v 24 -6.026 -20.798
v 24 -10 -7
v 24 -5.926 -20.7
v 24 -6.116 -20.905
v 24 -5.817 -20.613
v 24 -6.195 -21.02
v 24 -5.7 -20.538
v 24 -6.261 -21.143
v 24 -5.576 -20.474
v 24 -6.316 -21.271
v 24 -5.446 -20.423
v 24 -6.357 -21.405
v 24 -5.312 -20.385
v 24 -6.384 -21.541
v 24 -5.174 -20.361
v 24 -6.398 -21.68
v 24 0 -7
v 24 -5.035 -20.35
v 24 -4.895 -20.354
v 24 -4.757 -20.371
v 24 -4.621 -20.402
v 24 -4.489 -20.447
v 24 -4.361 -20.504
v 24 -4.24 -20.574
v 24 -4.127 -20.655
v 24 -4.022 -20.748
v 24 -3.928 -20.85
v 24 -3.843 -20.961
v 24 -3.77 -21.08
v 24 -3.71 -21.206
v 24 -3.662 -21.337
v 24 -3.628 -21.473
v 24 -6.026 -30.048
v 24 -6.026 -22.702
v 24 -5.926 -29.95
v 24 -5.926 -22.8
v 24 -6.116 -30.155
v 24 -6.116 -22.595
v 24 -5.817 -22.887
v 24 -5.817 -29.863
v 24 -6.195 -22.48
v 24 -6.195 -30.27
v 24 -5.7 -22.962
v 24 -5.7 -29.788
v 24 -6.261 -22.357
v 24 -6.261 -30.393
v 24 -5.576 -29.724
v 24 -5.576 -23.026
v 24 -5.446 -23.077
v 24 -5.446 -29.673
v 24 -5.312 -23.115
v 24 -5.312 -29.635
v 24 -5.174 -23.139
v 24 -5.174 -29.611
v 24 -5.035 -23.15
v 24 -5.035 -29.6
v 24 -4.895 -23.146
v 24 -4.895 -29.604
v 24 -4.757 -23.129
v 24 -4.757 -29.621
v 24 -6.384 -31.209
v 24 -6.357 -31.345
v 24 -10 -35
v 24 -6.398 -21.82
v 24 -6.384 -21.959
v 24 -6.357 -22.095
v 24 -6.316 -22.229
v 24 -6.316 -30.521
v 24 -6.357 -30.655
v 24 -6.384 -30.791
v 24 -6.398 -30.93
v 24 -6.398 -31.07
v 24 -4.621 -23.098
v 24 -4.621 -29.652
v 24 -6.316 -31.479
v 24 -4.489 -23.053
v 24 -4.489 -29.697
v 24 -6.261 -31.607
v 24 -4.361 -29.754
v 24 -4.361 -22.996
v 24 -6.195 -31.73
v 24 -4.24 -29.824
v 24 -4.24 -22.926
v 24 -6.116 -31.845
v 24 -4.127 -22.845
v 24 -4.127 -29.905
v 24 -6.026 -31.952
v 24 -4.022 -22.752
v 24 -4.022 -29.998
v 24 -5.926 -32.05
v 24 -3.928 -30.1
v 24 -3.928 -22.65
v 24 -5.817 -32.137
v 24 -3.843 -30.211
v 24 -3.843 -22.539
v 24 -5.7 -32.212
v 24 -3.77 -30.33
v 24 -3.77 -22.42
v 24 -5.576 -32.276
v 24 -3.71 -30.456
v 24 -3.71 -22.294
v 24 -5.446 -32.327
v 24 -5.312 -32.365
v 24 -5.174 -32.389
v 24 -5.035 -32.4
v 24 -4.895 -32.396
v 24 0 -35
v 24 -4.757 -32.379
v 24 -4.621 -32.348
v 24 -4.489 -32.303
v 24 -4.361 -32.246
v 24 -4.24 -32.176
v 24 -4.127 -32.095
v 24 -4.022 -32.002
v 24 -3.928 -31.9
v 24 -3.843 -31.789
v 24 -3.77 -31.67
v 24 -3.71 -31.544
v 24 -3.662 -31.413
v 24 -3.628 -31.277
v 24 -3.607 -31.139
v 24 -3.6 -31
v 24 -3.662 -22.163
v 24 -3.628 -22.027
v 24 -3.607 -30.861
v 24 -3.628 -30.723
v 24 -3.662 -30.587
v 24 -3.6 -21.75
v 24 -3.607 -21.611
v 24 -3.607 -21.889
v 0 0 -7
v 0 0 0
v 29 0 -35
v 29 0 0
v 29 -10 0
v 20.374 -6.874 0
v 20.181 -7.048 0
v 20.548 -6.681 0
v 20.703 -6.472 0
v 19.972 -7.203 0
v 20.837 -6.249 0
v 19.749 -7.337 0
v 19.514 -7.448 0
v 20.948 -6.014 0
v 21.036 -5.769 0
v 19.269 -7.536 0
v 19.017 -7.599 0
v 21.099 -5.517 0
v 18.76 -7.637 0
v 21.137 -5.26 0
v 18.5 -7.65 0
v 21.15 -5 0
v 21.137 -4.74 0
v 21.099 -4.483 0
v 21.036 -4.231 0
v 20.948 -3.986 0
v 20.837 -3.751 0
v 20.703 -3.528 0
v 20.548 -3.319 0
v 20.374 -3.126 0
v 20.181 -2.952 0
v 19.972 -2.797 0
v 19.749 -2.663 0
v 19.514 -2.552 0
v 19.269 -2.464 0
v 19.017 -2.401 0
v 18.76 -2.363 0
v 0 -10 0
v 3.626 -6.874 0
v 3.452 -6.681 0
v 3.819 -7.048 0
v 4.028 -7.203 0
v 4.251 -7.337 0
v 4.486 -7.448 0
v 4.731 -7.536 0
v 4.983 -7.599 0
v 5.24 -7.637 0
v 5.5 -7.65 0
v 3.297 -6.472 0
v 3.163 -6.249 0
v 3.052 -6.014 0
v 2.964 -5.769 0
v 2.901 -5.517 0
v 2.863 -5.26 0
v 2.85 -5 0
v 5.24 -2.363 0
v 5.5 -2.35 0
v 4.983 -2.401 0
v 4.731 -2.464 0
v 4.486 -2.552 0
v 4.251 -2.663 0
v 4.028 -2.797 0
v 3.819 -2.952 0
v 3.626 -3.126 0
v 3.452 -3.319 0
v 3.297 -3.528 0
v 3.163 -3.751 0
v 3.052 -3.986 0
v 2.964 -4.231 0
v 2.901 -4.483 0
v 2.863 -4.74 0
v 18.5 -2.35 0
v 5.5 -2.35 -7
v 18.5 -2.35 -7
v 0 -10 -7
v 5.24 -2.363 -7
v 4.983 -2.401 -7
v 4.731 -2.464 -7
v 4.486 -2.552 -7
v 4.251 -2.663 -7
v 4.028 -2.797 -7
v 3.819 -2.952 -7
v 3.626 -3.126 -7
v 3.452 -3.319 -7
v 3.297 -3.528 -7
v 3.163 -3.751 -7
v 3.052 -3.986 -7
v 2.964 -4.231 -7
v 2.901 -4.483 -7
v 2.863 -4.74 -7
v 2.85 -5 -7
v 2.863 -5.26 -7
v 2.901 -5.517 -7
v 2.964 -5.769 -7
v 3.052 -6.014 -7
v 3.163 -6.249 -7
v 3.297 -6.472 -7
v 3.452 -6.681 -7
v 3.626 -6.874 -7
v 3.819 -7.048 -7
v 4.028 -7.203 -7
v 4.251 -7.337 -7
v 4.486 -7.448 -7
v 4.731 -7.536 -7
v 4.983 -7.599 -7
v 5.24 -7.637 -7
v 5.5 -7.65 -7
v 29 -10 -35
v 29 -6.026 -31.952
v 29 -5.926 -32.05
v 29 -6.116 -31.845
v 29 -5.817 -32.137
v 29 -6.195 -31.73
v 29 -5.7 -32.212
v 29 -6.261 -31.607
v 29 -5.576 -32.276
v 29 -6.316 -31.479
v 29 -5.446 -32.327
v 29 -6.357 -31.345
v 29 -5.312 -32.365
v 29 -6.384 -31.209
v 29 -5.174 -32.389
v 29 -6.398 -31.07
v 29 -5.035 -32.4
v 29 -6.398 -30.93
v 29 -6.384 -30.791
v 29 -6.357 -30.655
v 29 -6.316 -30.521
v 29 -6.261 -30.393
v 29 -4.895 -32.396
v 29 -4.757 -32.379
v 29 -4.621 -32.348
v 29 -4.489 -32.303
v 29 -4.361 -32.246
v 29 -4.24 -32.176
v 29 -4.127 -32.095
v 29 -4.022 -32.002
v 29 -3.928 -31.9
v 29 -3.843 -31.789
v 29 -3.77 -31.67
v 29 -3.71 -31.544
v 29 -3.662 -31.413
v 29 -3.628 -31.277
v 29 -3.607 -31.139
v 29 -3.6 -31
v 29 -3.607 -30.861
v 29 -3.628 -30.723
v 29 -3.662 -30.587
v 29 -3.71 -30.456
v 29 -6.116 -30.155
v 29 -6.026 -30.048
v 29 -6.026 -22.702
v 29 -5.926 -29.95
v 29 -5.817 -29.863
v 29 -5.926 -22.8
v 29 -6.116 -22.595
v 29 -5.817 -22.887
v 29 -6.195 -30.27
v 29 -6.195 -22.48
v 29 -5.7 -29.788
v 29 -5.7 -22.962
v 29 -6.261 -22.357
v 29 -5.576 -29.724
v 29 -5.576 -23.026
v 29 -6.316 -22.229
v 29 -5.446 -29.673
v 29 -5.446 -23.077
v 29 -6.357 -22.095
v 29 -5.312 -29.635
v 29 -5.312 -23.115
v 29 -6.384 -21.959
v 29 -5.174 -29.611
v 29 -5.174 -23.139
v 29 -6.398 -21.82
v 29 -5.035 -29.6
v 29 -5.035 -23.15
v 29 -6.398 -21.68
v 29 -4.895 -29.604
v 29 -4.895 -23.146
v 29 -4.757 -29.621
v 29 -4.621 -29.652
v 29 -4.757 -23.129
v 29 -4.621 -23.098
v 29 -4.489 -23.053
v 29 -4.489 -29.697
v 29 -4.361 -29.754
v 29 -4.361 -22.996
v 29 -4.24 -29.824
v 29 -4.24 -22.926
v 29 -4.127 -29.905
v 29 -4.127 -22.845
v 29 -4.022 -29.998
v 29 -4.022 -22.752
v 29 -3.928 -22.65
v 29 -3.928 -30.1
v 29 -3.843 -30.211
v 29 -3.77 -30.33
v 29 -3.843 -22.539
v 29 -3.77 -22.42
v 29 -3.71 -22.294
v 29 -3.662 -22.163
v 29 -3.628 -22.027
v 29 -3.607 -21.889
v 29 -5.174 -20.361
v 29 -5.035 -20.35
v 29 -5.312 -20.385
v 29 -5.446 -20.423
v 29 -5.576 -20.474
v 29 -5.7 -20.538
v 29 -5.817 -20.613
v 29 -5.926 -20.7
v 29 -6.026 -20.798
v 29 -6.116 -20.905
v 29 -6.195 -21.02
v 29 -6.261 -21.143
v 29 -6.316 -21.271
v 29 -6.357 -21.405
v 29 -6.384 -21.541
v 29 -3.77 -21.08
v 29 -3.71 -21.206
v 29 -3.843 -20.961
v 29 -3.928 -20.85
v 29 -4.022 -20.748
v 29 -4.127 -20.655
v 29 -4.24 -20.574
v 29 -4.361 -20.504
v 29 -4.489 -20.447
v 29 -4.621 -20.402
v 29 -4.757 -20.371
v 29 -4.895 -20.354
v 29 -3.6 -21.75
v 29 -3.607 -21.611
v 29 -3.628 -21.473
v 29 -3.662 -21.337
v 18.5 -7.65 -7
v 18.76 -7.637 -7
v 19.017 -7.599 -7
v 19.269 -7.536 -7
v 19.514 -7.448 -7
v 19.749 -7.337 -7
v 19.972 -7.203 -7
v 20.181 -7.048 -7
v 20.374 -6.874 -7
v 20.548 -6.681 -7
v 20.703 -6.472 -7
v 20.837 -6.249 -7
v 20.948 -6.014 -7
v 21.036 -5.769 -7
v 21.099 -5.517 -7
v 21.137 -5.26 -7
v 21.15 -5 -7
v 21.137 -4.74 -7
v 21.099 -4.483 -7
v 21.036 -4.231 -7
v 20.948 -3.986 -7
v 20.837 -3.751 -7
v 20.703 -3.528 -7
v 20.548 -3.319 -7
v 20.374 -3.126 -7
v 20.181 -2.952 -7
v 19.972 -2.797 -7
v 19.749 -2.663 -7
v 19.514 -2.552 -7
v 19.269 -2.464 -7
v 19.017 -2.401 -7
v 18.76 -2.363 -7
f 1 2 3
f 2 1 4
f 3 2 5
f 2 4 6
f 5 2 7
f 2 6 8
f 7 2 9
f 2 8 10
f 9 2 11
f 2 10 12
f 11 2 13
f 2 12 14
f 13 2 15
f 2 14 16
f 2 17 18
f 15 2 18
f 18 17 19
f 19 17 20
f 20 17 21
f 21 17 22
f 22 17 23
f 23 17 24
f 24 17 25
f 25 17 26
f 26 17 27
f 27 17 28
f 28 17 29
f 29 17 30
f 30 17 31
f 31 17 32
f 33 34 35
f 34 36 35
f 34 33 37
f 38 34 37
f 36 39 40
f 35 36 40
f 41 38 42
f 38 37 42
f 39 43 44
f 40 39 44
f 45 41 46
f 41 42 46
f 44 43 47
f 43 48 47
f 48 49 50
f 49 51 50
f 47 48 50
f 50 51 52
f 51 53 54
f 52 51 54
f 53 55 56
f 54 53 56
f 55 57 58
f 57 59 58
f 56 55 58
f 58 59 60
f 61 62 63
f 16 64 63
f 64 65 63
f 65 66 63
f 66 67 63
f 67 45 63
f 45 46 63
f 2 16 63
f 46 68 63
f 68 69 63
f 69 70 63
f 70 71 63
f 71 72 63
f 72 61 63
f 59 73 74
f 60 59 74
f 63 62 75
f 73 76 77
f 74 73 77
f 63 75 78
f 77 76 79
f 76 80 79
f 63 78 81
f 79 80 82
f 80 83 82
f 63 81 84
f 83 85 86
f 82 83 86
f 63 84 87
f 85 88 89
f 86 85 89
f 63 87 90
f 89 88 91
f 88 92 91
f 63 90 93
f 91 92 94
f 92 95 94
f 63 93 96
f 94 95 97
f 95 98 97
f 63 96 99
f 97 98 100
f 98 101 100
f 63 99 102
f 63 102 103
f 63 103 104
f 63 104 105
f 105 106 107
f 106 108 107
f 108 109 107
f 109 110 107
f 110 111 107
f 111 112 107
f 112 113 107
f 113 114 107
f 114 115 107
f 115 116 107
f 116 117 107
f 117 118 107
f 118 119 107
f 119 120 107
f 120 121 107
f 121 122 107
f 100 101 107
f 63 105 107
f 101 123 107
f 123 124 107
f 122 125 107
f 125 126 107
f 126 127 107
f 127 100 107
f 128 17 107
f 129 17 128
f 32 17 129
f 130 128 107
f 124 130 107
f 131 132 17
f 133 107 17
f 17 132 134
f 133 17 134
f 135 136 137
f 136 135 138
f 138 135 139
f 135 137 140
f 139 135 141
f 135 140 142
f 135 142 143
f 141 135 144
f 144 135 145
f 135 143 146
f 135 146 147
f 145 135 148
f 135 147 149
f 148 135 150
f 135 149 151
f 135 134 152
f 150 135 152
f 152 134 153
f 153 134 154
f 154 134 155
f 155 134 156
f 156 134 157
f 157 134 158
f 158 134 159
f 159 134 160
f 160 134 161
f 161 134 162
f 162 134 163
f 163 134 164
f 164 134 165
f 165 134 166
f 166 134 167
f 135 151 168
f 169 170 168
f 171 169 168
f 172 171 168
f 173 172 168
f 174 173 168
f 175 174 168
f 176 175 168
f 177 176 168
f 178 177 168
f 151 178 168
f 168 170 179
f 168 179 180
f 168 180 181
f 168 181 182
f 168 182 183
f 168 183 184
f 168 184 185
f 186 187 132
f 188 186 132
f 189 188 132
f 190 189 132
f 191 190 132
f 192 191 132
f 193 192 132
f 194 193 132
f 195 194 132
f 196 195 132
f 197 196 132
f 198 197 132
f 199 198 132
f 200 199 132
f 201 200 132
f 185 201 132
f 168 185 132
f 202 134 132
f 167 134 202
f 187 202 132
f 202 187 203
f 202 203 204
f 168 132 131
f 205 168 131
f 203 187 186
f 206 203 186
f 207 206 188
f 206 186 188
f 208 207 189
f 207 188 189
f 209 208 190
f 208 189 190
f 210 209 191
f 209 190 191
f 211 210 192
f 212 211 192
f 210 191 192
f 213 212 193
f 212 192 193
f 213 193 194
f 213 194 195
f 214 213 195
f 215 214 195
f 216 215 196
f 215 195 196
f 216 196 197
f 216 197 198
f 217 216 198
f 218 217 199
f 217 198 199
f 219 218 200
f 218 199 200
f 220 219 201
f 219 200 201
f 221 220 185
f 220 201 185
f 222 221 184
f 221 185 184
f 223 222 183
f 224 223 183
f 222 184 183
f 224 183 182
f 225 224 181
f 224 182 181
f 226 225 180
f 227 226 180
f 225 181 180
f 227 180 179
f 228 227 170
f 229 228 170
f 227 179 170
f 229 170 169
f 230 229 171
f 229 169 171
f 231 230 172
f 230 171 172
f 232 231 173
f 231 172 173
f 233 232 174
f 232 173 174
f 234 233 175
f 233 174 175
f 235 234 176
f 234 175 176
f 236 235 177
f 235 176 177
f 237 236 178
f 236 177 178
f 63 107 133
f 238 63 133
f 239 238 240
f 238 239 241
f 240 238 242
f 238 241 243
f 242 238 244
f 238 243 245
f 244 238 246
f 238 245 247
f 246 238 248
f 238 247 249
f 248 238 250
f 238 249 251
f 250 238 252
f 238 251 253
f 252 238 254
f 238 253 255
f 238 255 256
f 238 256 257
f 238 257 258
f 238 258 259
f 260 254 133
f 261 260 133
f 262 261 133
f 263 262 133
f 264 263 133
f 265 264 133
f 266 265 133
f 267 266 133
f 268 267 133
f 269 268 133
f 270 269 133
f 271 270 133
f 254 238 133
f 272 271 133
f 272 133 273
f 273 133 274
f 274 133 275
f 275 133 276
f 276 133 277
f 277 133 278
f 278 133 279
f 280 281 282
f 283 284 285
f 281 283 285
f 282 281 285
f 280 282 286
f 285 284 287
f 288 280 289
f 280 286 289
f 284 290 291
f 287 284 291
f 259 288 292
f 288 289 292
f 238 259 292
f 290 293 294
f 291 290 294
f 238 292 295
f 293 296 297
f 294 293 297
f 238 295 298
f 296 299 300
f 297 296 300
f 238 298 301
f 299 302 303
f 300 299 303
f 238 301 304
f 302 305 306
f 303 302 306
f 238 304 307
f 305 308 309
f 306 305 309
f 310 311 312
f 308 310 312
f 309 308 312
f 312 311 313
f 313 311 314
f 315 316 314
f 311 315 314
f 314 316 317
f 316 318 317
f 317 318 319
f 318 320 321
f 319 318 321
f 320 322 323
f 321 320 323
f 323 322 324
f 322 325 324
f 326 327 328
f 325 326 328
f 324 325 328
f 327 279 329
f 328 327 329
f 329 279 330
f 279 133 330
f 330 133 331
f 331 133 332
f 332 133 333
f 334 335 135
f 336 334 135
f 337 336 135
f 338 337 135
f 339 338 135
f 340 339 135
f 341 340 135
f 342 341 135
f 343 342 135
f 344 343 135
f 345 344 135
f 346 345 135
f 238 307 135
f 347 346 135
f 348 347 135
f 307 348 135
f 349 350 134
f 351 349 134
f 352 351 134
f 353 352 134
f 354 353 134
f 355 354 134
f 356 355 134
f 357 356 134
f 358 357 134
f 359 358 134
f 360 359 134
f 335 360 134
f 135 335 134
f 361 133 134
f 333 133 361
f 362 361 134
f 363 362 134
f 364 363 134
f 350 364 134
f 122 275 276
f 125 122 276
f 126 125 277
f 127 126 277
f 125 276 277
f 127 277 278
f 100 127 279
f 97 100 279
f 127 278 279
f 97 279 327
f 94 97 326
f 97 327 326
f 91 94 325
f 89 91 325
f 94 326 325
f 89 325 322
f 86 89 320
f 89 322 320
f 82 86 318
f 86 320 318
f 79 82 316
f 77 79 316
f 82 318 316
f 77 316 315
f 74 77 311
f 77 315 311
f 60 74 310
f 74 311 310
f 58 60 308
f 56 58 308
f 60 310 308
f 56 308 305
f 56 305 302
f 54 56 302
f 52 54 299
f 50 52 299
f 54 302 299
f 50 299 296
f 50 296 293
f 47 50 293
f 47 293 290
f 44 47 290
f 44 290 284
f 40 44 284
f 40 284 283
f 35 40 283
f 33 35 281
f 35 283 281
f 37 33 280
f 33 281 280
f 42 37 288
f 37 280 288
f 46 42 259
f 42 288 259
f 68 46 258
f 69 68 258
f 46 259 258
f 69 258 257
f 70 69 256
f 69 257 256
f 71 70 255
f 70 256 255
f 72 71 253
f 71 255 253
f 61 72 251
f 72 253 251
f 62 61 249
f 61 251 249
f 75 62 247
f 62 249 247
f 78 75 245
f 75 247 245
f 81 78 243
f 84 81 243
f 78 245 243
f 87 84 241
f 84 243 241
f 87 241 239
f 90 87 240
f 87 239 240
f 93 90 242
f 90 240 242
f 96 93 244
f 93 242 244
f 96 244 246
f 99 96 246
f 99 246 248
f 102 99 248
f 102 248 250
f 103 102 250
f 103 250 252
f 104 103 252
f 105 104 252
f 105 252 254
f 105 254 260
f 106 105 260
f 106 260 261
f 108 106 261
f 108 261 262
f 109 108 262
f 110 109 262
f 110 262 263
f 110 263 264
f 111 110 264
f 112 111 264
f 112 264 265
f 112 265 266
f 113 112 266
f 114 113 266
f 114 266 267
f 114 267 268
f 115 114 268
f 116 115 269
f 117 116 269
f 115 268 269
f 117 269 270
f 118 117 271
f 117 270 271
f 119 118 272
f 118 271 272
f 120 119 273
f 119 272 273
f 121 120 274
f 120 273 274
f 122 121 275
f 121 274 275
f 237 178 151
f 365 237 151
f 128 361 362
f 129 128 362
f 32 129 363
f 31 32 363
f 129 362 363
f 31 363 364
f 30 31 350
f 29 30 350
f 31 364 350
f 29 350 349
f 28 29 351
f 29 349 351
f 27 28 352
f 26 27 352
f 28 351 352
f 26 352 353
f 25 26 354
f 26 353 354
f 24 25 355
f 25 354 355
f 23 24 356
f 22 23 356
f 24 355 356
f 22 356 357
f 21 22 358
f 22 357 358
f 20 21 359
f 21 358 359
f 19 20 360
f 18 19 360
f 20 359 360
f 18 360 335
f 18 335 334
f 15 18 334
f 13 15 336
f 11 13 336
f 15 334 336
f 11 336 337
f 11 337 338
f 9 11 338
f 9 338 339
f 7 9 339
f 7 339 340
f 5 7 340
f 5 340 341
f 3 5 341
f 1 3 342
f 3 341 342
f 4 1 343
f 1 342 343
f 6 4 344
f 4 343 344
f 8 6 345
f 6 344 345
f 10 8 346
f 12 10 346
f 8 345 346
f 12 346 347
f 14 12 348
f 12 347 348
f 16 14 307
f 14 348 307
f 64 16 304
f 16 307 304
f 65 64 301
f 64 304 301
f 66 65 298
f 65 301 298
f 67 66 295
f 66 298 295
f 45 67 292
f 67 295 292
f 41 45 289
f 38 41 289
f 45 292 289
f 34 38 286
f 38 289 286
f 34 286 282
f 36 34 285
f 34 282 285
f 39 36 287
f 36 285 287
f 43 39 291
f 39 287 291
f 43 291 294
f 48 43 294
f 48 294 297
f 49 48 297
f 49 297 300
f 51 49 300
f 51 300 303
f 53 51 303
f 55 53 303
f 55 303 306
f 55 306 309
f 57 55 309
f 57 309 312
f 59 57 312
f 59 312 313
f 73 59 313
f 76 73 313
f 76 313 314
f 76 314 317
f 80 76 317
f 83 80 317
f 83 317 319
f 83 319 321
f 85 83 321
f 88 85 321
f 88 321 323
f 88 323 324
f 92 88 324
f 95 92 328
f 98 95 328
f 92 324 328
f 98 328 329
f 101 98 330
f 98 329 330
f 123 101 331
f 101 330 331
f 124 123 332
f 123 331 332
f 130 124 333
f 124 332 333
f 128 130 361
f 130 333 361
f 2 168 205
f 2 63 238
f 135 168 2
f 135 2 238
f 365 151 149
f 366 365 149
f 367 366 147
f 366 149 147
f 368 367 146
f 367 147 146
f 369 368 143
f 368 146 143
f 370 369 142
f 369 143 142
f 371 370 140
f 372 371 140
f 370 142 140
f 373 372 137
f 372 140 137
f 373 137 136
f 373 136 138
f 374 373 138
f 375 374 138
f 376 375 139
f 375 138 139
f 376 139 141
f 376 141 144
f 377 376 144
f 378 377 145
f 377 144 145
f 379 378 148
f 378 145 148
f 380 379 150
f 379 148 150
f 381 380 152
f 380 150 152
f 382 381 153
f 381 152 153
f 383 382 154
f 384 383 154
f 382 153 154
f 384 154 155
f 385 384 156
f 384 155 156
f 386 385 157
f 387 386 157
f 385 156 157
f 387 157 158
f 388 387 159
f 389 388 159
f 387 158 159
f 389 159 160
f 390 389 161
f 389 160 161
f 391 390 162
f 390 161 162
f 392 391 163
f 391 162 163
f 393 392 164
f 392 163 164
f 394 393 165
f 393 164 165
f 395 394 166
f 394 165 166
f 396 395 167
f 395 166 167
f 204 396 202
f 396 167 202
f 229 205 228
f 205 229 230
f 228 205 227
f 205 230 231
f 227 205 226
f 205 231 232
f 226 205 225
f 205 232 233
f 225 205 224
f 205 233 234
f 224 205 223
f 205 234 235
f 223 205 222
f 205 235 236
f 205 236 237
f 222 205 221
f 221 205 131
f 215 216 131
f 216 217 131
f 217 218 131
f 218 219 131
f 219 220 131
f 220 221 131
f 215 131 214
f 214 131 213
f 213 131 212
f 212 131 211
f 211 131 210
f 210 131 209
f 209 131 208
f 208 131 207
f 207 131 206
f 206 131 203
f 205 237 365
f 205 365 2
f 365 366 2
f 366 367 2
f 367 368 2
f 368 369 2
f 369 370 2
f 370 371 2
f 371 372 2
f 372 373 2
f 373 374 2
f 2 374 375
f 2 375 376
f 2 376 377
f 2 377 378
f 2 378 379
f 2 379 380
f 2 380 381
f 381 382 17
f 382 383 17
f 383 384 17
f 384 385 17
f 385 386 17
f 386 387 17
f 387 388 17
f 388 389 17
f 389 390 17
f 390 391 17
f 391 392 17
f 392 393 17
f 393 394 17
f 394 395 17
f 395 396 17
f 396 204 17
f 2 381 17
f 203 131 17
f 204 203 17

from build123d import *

# Parameters (mm, degrees)
F1_DEPTH = 10
F2_W     = 13
F2_H     = 5.3
F3_DEPTH = 7
F4_R     = 1.4
F5_DEPTH = 5


with BuildPart() as f1:
    # F0 (on Front) → F1 (new body)
    with BuildSketch(Plane.XZ):
        Polygon((29, 0), (0, 0), (0, -7), (24, -7), (24, -35), (29, -35), align=None)
    extrude(amount=F1_DEPTH)

    # F2 (on face) → F3 (cut, through all)
    with BuildSketch(Plane.XY):
        with Locations((12, -5)):
            Rectangle(F2_W, F2_H)
        with BuildLine():
            ThreePointArc((5.5, -2.35), (2.85, -5), (5.5, -7.65))
            Line((5.5, -7.65), (5.5, -2.35))
        make_face()
        with BuildLine():
            Line((18.5, -2.35), (18.5, -7.65))
            ThreePointArc((18.5, -7.65), (21.15, -5), (18.5, -2.35))
        make_face()
    extrude(amount=-F3_DEPTH, mode=Mode.SUBTRACT)

    # F4 (on face) → F5 (cut, through all)
    with BuildSketch(Plane.YZ.offset(29)):
        with Locations((-5, -21.75)):
            Circle(F4_R)
        with Locations((-5, -31)):
            Circle(F4_R)
    extrude(amount=-F5_DEPTH, mode=Mode.SUBTRACT)


solid = f1.part
